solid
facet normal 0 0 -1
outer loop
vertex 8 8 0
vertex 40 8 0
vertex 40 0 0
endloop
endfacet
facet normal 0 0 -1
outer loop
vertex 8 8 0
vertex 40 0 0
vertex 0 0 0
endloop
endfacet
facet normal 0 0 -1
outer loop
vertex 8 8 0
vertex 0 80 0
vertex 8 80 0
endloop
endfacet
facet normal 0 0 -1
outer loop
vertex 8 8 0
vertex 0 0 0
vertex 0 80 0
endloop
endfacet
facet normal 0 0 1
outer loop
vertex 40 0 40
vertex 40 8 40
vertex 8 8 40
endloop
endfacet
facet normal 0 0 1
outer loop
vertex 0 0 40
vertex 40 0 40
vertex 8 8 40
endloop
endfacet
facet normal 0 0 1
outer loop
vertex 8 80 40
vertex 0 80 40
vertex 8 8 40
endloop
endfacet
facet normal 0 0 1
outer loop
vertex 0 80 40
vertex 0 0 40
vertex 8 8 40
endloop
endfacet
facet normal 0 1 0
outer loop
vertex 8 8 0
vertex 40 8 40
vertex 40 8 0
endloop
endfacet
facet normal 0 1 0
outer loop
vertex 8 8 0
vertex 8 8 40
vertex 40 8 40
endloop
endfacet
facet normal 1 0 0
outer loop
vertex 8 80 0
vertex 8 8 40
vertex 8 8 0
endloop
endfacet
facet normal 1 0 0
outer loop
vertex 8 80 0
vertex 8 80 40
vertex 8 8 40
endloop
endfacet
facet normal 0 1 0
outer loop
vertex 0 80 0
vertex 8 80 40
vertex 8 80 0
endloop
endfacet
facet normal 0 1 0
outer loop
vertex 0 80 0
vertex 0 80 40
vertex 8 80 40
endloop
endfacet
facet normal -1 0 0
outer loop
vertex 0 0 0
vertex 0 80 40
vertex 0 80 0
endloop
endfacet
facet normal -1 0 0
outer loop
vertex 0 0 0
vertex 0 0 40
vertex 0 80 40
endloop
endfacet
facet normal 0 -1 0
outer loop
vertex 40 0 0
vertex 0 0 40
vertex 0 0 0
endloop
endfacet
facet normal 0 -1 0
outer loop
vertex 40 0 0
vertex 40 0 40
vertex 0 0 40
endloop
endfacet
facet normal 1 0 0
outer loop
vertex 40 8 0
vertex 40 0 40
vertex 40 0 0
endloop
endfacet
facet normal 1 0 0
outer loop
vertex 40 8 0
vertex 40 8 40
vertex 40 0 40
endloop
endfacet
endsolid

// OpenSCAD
$fn = 32;

// ----------------------------------------------------------------------
// Structural section: angle 40 x 80 mm
// ----------------------------------------------------------------------

// --- parameters (mm) ---
sec_w = 40;               // leg width, X
sec_h = 80;               // leg height, Y
flange_t = 8;             // leg thickness
plate_t = 40;             // cut length, Z (extrusion height)

profile = [[0, 0], [40, 0], [40, 8], [8, 8], [8, 80], [0, 80]];  // primary outline, 6 points, counter clockwise

// --- the one profile operation ---
linear_extrude(height = plate_t) polygon(points = profile);
